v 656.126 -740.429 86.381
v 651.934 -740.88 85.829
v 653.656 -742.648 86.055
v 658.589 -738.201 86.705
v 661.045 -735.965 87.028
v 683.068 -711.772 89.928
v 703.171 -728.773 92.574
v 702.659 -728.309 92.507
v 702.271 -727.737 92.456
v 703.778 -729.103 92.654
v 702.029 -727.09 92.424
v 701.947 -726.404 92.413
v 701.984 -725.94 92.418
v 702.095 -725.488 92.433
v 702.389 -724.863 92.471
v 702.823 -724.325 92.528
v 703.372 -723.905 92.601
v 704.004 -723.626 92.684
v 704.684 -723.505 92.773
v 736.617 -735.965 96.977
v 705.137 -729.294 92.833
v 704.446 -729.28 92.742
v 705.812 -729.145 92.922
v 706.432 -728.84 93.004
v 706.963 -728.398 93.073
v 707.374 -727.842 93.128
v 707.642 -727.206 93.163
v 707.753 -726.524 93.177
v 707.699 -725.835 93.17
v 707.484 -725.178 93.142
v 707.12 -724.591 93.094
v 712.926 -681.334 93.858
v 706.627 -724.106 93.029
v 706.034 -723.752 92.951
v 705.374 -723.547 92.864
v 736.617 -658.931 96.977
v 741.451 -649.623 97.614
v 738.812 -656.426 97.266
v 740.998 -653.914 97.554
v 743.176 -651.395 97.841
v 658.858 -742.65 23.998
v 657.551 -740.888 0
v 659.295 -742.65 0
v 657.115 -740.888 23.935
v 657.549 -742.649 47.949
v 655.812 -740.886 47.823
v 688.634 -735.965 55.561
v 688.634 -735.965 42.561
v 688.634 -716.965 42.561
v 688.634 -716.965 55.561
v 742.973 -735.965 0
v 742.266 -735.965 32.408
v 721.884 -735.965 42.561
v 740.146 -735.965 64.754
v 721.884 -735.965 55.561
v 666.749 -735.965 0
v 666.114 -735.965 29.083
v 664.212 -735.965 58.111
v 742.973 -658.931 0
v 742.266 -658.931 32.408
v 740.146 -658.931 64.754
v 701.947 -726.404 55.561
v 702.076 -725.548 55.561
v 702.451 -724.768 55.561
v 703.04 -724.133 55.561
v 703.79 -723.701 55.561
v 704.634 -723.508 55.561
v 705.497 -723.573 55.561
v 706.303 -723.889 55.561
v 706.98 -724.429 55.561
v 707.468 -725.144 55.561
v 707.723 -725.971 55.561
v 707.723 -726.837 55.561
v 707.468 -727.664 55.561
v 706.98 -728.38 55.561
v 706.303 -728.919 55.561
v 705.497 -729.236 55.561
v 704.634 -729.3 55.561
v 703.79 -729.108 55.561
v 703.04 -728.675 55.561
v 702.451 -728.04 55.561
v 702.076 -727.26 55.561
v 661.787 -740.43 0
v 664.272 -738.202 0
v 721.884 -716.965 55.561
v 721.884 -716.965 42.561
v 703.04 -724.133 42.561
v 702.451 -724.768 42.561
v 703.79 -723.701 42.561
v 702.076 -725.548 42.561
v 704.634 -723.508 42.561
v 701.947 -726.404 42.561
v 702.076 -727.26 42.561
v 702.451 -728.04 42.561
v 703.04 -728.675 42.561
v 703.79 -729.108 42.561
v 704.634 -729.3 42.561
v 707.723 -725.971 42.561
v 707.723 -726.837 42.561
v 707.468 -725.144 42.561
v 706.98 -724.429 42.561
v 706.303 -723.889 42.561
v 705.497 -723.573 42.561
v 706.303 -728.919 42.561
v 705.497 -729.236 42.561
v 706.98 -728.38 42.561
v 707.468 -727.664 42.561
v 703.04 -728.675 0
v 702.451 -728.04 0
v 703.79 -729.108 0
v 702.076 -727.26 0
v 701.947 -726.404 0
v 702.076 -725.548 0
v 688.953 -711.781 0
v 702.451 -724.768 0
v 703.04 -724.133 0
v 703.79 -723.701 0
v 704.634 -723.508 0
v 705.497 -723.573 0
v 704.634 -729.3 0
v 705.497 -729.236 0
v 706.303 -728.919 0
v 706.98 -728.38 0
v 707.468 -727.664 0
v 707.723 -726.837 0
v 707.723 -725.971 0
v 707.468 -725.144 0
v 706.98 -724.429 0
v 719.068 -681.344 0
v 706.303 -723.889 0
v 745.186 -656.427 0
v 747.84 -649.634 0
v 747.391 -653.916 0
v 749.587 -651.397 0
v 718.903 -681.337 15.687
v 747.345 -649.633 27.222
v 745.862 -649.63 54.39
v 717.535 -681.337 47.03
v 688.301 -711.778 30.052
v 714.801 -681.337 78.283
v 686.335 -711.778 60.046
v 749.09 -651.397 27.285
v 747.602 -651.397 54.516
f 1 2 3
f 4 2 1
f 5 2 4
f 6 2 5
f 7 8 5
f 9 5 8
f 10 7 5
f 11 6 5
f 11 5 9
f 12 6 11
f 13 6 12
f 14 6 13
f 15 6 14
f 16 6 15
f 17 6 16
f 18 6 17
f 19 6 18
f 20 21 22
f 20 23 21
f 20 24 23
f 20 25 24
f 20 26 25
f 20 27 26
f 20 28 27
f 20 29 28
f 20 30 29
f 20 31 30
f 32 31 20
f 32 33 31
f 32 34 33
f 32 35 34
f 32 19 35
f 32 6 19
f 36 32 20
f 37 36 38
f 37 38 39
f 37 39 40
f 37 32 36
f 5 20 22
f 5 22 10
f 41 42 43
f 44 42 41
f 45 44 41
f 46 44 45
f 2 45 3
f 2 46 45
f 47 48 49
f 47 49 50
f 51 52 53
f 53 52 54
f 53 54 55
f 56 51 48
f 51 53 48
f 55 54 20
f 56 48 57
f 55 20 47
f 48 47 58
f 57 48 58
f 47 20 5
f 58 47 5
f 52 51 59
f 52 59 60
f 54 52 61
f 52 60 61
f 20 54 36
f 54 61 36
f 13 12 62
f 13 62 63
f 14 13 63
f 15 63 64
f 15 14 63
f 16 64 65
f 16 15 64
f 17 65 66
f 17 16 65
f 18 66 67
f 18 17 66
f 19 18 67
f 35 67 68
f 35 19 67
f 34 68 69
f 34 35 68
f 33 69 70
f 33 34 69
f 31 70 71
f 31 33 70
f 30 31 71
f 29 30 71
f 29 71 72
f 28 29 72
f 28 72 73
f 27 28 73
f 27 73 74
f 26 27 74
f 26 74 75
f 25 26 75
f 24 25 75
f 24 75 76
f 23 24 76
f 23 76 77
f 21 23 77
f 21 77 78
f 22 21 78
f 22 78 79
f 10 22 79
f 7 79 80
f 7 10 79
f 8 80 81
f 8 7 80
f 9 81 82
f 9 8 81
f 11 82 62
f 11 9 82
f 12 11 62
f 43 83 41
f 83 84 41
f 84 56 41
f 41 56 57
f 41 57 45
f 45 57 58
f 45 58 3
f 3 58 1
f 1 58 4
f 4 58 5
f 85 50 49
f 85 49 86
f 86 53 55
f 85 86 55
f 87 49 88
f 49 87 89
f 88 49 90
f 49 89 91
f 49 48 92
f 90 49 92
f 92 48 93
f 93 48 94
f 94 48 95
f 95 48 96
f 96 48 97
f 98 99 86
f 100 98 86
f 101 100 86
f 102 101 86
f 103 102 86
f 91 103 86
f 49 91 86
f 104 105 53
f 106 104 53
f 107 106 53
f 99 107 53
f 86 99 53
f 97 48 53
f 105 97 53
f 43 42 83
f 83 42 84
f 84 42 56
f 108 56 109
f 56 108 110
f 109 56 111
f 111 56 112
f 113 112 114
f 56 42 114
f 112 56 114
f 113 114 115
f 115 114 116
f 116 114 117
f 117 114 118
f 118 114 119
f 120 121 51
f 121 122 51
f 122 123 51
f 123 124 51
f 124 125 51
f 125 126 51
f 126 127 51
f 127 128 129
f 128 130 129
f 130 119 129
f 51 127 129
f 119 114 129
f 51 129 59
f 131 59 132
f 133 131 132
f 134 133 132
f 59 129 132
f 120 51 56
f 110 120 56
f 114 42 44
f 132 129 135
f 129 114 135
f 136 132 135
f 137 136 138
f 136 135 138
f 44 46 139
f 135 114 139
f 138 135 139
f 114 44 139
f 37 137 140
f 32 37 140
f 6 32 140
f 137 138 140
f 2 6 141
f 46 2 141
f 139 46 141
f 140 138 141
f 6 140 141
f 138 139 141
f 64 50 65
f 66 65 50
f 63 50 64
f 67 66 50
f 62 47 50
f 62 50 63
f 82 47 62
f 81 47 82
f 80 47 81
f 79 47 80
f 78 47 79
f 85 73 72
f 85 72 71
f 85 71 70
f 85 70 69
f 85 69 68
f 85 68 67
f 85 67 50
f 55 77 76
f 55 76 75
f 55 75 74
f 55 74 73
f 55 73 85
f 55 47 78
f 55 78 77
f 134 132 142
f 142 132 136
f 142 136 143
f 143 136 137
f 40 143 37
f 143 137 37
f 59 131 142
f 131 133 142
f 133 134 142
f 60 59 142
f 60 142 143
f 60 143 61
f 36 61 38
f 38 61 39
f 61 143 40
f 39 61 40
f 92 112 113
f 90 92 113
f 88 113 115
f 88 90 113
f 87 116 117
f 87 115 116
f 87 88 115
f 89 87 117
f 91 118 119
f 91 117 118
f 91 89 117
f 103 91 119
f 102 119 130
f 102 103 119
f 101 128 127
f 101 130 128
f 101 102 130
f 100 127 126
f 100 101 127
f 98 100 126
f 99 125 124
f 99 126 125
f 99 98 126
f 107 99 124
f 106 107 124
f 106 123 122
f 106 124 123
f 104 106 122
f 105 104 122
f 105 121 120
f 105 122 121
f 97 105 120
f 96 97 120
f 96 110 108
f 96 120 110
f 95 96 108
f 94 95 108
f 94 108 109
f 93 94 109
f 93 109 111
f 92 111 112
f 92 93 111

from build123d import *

# Parameters (mm, degrees)
REVOLVE2_ANGLE           = 7.5
SKETCH4_W                = 33.25
SKETCH4_H                = 13
CUT_EXTRUDE5_DEPTH       = 19
SKETCH7_W                = 33.25
SKETCH7_H                = 13
CUT_EXTRUDE7_DEPTH       = 19
CUT_EXTRUDE11_DEPTH      = 1411.389609827
CUT_EXTRUDE11_DEPTH_BACK = 1411.389609827
SKETCH10_W               = 2135.270707333
SKETCH10_H               = 1606.592084843
SKETCH10_W_2             = 966.47859296
SKETCH10_H_2             = 313.33759653
CUT_EXTRUDE12_DEPTH      = 268.568661532
CUT_EXTRUDE12_DEPTH_BACK = 268.568661532
CUT_EXTRUDE13_DEPTH      = 1057.643677587
CUT_EXTRUDE13_DEPTH_BACK = 1057.643677587
SKETCH14_R               = 2.904277488


with BuildPart() as part:
    # Sketch2 → Revolve2 (revolve)
    with BuildSketch(Plane.XY):
        with BuildLine():
            Line((0, 993.075249624), (0, 990.6))
            ThreePointArc((0, 990.6), (990.6, 0), (0, -990.6))
            Line((0, -990.6), (0, -993.075249624))
            ThreePointArc((0, -993.075249624), (357.30221933, -926.570869107), (666.748724276, -735.965073963))
            Line((666.748724276, -735.965073963), (742.973100692, -735.965073963))
            Line((742.973100692, -735.965073963), (742.973100692, -658.930514596))
            ThreePointArc((742.973100692, -658.930514596), (993.075236283, 0.162783709), (742.757038562, 659.174053709))
            Line((742.757038562, 659.174053709), (742.757038562, 722.715073963))
            Line((742.757038562, 722.715073963), (681.088374063, 722.715073963))
            ThreePointArc((681.088374063, 722.715073963), (366.393230651, 923.013787519), (0, 993.075249624))
        make_face()
    revolve(axis=Axis((0, 993.075249624, 0), (0, -1, 0)), revolution_arc=REVOLVE2_ANGLE)

    # Sketch4 → Cut-Extrude5 (cut)
    with BuildSketch(Plane.XZ.offset(735.965073963)):
        with Locations((705.258501449, 49.061390401)):
            Rectangle(SKETCH4_W, SKETCH4_H)
    extrude(amount=-CUT_EXTRUDE5_DEPTH, mode=Mode.SUBTRACT)

    # Sketch7 → Cut-Extrude7 (cut)
    with BuildSketch(Plane(origin=(0, 722.715073963, 0), x_dir=(-1, 0, 0), z_dir=(0, 1, 0))):
        with Locations((-714.999743141, 46.422731407)):
            Rectangle(SKETCH7_W, SKETCH7_H)
    extrude(amount=-CUT_EXTRUDE7_DEPTH, mode=Mode.SUBTRACT)

    # Sketch10 → Cut-Extrude11 (cut, two sides: drawn at the far end of the back side and taken through both)
    with BuildSketch(Plane.XY.offset(-CUT_EXTRUDE11_DEPTH_BACK)):
        with Locations((557.489585025, 267.498147025)):
            Rectangle(SKETCH10_W, SKETCH10_H)
        with Locations((142.971717026, -995.026755504)):
            Rectangle(SKETCH10_W_2, SKETCH10_H_2)
    extrude(amount=CUT_EXTRUDE11_DEPTH + CUT_EXTRUDE11_DEPTH_BACK, mode=Mode.SUBTRACT)

    # Sketch13 → Cut-Extrude12 (cut, two sides: drawn at the far end of the back side and taken through both)
    with BuildSketch(Plane(origin=(698.790958408, -705.612958968, 0), x_dir=(-0.7105332241790022, -0.7036636535574307, 0), z_dir=(0.7036636535574307, -0.7105332241790022, 0)).offset(-CUT_EXTRUDE12_DEPTH_BACK)):
        with BuildLine():
            Line((-69.681834332, -97.908818451), (-74.241619372, -183.690208107))
            Line((-74.241619372, -183.690208107), (-254.584821077, -153.98925059))
            Line((-254.584821077, -153.98925059), (-254.584821077, 36.219080684))
            Line((-254.584821077, 36.219080684), (-86.443079936, 59.043829873))
            Line((-86.443079936, 59.043829873), (-74.241619372, 0))
            add(Edge.make_bspline(
                [(-74.241619372, 0), (-74.241619372, -16.364172879), (-73.860987213, -32.728340935), (-72.340019213, -65.387598256), (-71.199683881, -81.682677909), (-69.681834332, -97.908818451)],
                knots=[0, 0, 0, 0, 0.5, 0.5, 1, 1, 1, 1], degree=3))
        make_face()
        with BuildLine():
            Line((58.134257499, -86.096803452), (71.382276514, -183.690208107))
            Line((71.382276514, -183.690208107), (231.781280969, -140.799513279))
            Line((231.781280969, -140.799513279), (262.814223376, 47.631455278))
            Line((262.814223376, 47.631455278), (38.648828203, 72.943770658))
            Line((38.648828203, 72.943770658), (54.124752058, 0))
            add(Edge.make_bspline(
                [(54.124752058, 0), (54.124752058, -14.39118635), (54.459503156, -28.782368118), (55.797005676, -57.502130085), (56.799756733, -71.830701127), (58.134257499, -86.096803452)],
                knots=[0, 0, 0, 0, 0.5, 0.5, 1, 1, 1, 1], degree=3))
        make_face()
    extrude(amount=CUT_EXTRUDE12_DEPTH + CUT_EXTRUDE12_DEPTH_BACK, mode=Mode.SUBTRACT)

    # Sketch14 → Cut-Extrude13 (cut, two sides: drawn at the far end of the back side and taken through both)
    with BuildSketch(Plane(origin=(0, 0, 55.561390401), x_dir=(-1, 0, 0), z_dir=(0, 0, -1)).offset(-CUT_EXTRUDE13_DEPTH_BACK)):
        with Locations((-704.851033101, -726.404105815)):
            Circle(SKETCH14_R)
    extrude(amount=CUT_EXTRUDE13_DEPTH + CUT_EXTRUDE13_DEPTH_BACK, mode=Mode.SUBTRACT)


solid = part.part
